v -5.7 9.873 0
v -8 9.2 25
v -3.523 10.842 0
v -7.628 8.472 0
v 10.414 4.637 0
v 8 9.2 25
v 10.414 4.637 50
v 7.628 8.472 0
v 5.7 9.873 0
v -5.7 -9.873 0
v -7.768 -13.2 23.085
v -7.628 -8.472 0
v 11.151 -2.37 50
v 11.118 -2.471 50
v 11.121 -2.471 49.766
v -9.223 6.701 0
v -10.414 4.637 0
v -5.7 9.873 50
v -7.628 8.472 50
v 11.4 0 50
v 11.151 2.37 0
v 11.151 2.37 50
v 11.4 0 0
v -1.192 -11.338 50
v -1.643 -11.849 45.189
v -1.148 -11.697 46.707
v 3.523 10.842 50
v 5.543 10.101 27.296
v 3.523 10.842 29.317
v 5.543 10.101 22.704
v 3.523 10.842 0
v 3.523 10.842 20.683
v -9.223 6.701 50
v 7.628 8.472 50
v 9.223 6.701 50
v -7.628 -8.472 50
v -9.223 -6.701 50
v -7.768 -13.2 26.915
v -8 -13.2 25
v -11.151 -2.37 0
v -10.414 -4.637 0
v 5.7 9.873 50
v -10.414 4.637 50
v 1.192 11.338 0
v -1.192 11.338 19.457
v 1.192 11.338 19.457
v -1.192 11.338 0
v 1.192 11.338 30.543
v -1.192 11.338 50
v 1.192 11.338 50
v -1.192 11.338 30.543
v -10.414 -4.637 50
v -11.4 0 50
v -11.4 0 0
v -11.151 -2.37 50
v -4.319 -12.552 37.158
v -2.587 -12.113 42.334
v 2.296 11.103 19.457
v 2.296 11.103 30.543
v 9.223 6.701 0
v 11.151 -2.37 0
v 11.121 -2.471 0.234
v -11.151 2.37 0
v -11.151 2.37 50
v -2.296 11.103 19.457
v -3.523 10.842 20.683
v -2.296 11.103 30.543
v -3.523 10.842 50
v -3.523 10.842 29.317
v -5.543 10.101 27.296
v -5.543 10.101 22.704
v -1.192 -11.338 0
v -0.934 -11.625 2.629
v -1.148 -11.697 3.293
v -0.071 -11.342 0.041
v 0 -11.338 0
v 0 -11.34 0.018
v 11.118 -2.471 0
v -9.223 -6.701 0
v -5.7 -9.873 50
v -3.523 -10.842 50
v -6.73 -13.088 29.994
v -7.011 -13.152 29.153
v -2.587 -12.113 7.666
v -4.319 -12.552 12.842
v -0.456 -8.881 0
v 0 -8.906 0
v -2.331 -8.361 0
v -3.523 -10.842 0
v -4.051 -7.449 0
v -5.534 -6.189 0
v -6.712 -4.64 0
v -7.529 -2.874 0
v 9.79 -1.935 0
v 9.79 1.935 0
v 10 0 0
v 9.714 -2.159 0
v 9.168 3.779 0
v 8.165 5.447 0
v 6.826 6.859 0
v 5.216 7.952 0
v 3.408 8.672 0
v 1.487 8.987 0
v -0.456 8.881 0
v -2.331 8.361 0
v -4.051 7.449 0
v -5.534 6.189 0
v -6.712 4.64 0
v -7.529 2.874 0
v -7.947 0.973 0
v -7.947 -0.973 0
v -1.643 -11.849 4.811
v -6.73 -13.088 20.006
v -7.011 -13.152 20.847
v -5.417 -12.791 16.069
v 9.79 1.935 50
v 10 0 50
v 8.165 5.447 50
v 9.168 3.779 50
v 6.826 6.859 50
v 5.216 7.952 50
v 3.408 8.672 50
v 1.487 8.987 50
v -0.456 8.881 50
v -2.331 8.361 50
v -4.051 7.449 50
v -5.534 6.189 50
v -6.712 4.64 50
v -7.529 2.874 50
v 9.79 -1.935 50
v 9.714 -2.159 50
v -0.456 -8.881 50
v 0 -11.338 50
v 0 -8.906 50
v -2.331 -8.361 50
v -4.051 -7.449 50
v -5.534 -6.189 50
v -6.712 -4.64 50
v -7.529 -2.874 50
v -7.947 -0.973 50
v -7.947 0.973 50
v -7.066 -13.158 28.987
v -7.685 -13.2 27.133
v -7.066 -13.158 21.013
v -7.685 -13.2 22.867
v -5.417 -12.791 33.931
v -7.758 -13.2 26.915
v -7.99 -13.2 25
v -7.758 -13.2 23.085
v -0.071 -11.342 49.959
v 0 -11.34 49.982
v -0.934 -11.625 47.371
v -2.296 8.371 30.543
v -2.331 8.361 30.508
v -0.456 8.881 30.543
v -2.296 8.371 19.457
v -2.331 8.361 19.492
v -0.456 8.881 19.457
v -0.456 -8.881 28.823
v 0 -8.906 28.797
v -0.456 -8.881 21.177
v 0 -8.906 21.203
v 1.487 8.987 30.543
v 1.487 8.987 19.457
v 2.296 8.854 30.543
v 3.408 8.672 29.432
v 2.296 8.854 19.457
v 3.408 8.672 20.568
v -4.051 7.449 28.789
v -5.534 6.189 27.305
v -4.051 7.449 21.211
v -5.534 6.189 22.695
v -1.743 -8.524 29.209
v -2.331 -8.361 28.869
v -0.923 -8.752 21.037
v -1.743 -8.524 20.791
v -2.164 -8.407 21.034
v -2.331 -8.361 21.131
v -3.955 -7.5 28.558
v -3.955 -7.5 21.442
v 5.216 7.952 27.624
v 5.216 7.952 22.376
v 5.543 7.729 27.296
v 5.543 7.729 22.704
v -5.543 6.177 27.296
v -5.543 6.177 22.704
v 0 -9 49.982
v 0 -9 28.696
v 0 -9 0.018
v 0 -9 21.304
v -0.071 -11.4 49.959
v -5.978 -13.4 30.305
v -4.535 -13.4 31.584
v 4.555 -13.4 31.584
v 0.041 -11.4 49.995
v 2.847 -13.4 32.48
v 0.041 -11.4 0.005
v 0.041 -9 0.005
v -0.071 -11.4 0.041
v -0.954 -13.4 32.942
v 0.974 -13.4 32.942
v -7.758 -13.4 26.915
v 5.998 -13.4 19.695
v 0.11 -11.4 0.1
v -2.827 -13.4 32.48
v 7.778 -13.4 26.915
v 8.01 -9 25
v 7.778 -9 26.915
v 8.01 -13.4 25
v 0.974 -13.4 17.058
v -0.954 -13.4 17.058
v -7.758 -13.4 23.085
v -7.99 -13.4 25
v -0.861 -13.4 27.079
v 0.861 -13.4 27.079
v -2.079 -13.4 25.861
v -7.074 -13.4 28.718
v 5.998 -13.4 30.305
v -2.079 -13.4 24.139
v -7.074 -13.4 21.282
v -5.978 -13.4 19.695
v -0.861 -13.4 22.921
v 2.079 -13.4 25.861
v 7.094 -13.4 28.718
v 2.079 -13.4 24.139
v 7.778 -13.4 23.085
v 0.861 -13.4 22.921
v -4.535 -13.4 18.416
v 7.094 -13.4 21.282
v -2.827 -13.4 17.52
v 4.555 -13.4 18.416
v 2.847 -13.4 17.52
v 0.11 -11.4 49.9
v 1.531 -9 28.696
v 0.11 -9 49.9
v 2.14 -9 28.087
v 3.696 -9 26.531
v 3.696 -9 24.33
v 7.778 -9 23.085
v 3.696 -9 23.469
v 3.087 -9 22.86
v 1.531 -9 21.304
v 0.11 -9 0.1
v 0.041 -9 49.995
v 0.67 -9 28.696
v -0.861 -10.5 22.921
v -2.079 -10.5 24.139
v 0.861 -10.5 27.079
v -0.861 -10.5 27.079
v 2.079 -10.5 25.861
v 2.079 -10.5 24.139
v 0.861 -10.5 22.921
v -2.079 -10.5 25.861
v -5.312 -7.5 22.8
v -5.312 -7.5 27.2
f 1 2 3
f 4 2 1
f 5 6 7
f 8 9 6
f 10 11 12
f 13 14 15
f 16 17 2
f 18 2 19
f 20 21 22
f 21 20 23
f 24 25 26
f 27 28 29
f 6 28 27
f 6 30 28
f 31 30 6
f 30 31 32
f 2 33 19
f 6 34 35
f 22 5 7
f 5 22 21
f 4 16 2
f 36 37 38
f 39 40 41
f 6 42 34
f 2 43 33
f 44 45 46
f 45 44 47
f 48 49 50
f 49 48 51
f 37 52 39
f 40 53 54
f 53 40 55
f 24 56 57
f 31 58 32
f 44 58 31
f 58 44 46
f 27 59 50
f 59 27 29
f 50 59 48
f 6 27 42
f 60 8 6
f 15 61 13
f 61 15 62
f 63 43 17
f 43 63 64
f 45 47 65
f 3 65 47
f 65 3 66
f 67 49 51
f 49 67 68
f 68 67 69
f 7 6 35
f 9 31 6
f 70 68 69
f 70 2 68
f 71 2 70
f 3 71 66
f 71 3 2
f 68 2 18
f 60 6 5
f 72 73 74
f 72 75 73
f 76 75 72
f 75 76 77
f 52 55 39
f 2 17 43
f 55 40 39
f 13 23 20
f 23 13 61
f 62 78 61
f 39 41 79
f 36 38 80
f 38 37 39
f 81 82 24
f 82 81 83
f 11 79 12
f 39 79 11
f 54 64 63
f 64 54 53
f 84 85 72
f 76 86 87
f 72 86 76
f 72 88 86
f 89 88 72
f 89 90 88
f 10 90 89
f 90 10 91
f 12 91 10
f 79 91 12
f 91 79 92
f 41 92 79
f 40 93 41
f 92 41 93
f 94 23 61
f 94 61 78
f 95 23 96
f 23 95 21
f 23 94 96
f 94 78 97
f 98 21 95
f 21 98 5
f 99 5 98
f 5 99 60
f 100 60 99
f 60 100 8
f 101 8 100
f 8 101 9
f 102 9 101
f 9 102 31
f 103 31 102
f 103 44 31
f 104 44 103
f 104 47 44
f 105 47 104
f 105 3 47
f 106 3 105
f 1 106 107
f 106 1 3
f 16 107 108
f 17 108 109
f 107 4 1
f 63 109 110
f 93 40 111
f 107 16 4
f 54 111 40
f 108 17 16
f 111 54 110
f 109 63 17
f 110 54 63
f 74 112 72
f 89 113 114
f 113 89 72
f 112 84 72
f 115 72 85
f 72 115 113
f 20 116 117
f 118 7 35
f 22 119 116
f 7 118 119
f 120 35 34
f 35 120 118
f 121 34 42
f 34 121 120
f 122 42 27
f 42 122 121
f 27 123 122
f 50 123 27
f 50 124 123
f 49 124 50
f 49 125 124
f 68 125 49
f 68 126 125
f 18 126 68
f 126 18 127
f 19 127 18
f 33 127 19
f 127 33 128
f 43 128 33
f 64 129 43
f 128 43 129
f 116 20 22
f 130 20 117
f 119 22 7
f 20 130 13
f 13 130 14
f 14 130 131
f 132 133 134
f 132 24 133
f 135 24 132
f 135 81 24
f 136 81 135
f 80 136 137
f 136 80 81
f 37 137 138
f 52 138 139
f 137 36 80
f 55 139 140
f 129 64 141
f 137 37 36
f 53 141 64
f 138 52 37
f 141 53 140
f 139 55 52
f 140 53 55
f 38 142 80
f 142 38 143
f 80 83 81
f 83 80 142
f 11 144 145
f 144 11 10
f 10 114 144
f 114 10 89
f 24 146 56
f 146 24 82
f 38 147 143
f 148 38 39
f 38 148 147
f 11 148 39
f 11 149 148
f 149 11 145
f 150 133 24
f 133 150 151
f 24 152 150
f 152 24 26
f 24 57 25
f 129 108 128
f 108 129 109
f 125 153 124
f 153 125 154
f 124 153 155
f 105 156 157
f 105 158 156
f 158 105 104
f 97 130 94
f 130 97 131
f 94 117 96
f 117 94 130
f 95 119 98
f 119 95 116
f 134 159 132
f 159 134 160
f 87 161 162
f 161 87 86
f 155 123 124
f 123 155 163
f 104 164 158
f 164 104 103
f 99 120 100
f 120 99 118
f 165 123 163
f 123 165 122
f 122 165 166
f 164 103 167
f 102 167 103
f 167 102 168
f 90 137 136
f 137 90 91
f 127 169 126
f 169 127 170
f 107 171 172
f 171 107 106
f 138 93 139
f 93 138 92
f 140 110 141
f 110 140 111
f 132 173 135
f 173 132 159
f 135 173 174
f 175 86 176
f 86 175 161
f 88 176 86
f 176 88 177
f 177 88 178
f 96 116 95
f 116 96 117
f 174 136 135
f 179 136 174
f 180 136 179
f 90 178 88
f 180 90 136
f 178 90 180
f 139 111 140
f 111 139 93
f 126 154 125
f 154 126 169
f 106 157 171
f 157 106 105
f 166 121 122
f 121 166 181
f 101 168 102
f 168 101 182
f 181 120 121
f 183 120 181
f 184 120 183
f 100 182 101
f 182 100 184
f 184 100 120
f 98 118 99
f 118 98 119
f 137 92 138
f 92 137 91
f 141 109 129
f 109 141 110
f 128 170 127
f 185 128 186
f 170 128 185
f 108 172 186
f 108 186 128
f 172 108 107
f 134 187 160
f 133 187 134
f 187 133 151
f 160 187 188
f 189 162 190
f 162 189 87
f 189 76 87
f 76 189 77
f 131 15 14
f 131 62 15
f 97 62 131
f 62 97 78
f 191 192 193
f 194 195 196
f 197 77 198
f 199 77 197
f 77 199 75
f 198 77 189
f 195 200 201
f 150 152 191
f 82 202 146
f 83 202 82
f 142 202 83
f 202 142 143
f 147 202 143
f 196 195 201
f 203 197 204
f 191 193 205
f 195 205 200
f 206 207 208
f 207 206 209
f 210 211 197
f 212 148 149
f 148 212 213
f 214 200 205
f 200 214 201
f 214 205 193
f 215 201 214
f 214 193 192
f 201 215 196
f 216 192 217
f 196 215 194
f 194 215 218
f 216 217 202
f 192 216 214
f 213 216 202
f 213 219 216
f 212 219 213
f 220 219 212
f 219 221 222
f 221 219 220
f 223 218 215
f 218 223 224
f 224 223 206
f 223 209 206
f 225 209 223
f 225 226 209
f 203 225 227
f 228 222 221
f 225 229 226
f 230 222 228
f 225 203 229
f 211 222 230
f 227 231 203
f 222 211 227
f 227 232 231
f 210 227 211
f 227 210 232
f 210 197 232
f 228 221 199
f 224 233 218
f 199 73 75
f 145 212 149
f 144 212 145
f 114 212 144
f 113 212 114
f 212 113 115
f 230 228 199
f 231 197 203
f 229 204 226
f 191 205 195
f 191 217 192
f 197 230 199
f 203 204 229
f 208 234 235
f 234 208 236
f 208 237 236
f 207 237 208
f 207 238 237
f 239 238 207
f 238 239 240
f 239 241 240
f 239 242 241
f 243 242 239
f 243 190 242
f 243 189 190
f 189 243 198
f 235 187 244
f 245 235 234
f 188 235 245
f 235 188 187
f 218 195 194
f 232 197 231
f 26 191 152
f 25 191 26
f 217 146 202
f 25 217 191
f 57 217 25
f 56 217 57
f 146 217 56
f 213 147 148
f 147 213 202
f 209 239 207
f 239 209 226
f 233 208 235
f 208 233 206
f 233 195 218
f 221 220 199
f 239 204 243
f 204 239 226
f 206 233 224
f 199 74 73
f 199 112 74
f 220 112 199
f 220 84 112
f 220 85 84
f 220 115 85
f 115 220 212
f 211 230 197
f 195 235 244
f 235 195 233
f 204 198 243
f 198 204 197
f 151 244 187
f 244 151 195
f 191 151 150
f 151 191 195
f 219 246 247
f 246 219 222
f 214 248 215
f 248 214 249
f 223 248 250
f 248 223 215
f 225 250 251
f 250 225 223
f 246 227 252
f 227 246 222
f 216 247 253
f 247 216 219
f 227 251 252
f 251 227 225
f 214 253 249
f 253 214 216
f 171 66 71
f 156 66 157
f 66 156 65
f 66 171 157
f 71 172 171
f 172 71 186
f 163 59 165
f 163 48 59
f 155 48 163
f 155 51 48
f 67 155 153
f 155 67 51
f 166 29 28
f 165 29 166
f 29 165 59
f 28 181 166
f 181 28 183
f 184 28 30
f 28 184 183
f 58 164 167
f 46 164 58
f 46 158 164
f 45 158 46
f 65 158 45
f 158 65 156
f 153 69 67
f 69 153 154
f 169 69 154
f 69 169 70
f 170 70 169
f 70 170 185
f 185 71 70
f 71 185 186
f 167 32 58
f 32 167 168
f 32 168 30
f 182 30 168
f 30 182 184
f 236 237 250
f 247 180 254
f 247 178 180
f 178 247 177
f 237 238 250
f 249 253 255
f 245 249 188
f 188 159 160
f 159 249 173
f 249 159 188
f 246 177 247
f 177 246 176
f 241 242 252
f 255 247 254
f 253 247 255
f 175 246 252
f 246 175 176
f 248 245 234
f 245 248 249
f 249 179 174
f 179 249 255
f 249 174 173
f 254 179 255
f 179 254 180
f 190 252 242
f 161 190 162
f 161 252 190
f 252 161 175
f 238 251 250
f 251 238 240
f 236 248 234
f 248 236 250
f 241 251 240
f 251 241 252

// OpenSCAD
trayWid = 18;
thickness = 2.4;
len = 50;

t2 = sqrt(2*thickness*thickness)/2;
translate([0,0,len/2]) rotate([90,0,0]) difference() {
	rotate([90,0,0]) tray();
	rotate([0,0,22.5]) {
		cylinder(r=2.25, h=50, center=true, $fn=8);
		translate([0,0,-45]) cylinder(r=6, h=50, center=false, $fn=8);
		translate([0,0,trayWid/2]) cylinder(r1=5.75, r2=2.25, h=3, center=true, $fn=8);
	}
}

module tray() {
	difference() {
		outside();
		translate([1,0,0]) cylinder(r=trayWid/2, h=len+1, center=true); // hollow it out
		linear_extrude(height=len+1, center=true) polygon([
			[0,0],
			[0, trayWid*2],
			[trayWid, 4],
			]);
	}
	translate([0.01,0,0]) hull() {
		// translate([0,trayWid/2,-13/2]) cube(size=[6, thickness+2, 13], center=false);
		translate([0,trayWid/2,0]) rotate([-90,0,0]) cylinder(r=trayWid/2-1, h=thickness+2, center=false);
		translate([0, trayWid/2+thickness, -len/2+0.1]) rotate([90,0,0]) cylinder(r=0.1, h=thickness, center=false);
		translate([0, trayWid/2+thickness, len/2-0.1]) rotate([90,0,0]) cylinder(r=0.1, h=thickness, center=false);
		}		
}

module outside() {
	r = trayWid/2+thickness;
	tx = [1,1];
	hull() {
		cylinder(r=r, h=len, center=true);
		// translate([-r/2,r/2+2,0]) cube(size=[r, r, 13], center=true);
		translate([0,2,0]) rotate([90,0,0]) cylinder(r=8, h=trayWid+thickness+2, center=true); // 
	}

}
